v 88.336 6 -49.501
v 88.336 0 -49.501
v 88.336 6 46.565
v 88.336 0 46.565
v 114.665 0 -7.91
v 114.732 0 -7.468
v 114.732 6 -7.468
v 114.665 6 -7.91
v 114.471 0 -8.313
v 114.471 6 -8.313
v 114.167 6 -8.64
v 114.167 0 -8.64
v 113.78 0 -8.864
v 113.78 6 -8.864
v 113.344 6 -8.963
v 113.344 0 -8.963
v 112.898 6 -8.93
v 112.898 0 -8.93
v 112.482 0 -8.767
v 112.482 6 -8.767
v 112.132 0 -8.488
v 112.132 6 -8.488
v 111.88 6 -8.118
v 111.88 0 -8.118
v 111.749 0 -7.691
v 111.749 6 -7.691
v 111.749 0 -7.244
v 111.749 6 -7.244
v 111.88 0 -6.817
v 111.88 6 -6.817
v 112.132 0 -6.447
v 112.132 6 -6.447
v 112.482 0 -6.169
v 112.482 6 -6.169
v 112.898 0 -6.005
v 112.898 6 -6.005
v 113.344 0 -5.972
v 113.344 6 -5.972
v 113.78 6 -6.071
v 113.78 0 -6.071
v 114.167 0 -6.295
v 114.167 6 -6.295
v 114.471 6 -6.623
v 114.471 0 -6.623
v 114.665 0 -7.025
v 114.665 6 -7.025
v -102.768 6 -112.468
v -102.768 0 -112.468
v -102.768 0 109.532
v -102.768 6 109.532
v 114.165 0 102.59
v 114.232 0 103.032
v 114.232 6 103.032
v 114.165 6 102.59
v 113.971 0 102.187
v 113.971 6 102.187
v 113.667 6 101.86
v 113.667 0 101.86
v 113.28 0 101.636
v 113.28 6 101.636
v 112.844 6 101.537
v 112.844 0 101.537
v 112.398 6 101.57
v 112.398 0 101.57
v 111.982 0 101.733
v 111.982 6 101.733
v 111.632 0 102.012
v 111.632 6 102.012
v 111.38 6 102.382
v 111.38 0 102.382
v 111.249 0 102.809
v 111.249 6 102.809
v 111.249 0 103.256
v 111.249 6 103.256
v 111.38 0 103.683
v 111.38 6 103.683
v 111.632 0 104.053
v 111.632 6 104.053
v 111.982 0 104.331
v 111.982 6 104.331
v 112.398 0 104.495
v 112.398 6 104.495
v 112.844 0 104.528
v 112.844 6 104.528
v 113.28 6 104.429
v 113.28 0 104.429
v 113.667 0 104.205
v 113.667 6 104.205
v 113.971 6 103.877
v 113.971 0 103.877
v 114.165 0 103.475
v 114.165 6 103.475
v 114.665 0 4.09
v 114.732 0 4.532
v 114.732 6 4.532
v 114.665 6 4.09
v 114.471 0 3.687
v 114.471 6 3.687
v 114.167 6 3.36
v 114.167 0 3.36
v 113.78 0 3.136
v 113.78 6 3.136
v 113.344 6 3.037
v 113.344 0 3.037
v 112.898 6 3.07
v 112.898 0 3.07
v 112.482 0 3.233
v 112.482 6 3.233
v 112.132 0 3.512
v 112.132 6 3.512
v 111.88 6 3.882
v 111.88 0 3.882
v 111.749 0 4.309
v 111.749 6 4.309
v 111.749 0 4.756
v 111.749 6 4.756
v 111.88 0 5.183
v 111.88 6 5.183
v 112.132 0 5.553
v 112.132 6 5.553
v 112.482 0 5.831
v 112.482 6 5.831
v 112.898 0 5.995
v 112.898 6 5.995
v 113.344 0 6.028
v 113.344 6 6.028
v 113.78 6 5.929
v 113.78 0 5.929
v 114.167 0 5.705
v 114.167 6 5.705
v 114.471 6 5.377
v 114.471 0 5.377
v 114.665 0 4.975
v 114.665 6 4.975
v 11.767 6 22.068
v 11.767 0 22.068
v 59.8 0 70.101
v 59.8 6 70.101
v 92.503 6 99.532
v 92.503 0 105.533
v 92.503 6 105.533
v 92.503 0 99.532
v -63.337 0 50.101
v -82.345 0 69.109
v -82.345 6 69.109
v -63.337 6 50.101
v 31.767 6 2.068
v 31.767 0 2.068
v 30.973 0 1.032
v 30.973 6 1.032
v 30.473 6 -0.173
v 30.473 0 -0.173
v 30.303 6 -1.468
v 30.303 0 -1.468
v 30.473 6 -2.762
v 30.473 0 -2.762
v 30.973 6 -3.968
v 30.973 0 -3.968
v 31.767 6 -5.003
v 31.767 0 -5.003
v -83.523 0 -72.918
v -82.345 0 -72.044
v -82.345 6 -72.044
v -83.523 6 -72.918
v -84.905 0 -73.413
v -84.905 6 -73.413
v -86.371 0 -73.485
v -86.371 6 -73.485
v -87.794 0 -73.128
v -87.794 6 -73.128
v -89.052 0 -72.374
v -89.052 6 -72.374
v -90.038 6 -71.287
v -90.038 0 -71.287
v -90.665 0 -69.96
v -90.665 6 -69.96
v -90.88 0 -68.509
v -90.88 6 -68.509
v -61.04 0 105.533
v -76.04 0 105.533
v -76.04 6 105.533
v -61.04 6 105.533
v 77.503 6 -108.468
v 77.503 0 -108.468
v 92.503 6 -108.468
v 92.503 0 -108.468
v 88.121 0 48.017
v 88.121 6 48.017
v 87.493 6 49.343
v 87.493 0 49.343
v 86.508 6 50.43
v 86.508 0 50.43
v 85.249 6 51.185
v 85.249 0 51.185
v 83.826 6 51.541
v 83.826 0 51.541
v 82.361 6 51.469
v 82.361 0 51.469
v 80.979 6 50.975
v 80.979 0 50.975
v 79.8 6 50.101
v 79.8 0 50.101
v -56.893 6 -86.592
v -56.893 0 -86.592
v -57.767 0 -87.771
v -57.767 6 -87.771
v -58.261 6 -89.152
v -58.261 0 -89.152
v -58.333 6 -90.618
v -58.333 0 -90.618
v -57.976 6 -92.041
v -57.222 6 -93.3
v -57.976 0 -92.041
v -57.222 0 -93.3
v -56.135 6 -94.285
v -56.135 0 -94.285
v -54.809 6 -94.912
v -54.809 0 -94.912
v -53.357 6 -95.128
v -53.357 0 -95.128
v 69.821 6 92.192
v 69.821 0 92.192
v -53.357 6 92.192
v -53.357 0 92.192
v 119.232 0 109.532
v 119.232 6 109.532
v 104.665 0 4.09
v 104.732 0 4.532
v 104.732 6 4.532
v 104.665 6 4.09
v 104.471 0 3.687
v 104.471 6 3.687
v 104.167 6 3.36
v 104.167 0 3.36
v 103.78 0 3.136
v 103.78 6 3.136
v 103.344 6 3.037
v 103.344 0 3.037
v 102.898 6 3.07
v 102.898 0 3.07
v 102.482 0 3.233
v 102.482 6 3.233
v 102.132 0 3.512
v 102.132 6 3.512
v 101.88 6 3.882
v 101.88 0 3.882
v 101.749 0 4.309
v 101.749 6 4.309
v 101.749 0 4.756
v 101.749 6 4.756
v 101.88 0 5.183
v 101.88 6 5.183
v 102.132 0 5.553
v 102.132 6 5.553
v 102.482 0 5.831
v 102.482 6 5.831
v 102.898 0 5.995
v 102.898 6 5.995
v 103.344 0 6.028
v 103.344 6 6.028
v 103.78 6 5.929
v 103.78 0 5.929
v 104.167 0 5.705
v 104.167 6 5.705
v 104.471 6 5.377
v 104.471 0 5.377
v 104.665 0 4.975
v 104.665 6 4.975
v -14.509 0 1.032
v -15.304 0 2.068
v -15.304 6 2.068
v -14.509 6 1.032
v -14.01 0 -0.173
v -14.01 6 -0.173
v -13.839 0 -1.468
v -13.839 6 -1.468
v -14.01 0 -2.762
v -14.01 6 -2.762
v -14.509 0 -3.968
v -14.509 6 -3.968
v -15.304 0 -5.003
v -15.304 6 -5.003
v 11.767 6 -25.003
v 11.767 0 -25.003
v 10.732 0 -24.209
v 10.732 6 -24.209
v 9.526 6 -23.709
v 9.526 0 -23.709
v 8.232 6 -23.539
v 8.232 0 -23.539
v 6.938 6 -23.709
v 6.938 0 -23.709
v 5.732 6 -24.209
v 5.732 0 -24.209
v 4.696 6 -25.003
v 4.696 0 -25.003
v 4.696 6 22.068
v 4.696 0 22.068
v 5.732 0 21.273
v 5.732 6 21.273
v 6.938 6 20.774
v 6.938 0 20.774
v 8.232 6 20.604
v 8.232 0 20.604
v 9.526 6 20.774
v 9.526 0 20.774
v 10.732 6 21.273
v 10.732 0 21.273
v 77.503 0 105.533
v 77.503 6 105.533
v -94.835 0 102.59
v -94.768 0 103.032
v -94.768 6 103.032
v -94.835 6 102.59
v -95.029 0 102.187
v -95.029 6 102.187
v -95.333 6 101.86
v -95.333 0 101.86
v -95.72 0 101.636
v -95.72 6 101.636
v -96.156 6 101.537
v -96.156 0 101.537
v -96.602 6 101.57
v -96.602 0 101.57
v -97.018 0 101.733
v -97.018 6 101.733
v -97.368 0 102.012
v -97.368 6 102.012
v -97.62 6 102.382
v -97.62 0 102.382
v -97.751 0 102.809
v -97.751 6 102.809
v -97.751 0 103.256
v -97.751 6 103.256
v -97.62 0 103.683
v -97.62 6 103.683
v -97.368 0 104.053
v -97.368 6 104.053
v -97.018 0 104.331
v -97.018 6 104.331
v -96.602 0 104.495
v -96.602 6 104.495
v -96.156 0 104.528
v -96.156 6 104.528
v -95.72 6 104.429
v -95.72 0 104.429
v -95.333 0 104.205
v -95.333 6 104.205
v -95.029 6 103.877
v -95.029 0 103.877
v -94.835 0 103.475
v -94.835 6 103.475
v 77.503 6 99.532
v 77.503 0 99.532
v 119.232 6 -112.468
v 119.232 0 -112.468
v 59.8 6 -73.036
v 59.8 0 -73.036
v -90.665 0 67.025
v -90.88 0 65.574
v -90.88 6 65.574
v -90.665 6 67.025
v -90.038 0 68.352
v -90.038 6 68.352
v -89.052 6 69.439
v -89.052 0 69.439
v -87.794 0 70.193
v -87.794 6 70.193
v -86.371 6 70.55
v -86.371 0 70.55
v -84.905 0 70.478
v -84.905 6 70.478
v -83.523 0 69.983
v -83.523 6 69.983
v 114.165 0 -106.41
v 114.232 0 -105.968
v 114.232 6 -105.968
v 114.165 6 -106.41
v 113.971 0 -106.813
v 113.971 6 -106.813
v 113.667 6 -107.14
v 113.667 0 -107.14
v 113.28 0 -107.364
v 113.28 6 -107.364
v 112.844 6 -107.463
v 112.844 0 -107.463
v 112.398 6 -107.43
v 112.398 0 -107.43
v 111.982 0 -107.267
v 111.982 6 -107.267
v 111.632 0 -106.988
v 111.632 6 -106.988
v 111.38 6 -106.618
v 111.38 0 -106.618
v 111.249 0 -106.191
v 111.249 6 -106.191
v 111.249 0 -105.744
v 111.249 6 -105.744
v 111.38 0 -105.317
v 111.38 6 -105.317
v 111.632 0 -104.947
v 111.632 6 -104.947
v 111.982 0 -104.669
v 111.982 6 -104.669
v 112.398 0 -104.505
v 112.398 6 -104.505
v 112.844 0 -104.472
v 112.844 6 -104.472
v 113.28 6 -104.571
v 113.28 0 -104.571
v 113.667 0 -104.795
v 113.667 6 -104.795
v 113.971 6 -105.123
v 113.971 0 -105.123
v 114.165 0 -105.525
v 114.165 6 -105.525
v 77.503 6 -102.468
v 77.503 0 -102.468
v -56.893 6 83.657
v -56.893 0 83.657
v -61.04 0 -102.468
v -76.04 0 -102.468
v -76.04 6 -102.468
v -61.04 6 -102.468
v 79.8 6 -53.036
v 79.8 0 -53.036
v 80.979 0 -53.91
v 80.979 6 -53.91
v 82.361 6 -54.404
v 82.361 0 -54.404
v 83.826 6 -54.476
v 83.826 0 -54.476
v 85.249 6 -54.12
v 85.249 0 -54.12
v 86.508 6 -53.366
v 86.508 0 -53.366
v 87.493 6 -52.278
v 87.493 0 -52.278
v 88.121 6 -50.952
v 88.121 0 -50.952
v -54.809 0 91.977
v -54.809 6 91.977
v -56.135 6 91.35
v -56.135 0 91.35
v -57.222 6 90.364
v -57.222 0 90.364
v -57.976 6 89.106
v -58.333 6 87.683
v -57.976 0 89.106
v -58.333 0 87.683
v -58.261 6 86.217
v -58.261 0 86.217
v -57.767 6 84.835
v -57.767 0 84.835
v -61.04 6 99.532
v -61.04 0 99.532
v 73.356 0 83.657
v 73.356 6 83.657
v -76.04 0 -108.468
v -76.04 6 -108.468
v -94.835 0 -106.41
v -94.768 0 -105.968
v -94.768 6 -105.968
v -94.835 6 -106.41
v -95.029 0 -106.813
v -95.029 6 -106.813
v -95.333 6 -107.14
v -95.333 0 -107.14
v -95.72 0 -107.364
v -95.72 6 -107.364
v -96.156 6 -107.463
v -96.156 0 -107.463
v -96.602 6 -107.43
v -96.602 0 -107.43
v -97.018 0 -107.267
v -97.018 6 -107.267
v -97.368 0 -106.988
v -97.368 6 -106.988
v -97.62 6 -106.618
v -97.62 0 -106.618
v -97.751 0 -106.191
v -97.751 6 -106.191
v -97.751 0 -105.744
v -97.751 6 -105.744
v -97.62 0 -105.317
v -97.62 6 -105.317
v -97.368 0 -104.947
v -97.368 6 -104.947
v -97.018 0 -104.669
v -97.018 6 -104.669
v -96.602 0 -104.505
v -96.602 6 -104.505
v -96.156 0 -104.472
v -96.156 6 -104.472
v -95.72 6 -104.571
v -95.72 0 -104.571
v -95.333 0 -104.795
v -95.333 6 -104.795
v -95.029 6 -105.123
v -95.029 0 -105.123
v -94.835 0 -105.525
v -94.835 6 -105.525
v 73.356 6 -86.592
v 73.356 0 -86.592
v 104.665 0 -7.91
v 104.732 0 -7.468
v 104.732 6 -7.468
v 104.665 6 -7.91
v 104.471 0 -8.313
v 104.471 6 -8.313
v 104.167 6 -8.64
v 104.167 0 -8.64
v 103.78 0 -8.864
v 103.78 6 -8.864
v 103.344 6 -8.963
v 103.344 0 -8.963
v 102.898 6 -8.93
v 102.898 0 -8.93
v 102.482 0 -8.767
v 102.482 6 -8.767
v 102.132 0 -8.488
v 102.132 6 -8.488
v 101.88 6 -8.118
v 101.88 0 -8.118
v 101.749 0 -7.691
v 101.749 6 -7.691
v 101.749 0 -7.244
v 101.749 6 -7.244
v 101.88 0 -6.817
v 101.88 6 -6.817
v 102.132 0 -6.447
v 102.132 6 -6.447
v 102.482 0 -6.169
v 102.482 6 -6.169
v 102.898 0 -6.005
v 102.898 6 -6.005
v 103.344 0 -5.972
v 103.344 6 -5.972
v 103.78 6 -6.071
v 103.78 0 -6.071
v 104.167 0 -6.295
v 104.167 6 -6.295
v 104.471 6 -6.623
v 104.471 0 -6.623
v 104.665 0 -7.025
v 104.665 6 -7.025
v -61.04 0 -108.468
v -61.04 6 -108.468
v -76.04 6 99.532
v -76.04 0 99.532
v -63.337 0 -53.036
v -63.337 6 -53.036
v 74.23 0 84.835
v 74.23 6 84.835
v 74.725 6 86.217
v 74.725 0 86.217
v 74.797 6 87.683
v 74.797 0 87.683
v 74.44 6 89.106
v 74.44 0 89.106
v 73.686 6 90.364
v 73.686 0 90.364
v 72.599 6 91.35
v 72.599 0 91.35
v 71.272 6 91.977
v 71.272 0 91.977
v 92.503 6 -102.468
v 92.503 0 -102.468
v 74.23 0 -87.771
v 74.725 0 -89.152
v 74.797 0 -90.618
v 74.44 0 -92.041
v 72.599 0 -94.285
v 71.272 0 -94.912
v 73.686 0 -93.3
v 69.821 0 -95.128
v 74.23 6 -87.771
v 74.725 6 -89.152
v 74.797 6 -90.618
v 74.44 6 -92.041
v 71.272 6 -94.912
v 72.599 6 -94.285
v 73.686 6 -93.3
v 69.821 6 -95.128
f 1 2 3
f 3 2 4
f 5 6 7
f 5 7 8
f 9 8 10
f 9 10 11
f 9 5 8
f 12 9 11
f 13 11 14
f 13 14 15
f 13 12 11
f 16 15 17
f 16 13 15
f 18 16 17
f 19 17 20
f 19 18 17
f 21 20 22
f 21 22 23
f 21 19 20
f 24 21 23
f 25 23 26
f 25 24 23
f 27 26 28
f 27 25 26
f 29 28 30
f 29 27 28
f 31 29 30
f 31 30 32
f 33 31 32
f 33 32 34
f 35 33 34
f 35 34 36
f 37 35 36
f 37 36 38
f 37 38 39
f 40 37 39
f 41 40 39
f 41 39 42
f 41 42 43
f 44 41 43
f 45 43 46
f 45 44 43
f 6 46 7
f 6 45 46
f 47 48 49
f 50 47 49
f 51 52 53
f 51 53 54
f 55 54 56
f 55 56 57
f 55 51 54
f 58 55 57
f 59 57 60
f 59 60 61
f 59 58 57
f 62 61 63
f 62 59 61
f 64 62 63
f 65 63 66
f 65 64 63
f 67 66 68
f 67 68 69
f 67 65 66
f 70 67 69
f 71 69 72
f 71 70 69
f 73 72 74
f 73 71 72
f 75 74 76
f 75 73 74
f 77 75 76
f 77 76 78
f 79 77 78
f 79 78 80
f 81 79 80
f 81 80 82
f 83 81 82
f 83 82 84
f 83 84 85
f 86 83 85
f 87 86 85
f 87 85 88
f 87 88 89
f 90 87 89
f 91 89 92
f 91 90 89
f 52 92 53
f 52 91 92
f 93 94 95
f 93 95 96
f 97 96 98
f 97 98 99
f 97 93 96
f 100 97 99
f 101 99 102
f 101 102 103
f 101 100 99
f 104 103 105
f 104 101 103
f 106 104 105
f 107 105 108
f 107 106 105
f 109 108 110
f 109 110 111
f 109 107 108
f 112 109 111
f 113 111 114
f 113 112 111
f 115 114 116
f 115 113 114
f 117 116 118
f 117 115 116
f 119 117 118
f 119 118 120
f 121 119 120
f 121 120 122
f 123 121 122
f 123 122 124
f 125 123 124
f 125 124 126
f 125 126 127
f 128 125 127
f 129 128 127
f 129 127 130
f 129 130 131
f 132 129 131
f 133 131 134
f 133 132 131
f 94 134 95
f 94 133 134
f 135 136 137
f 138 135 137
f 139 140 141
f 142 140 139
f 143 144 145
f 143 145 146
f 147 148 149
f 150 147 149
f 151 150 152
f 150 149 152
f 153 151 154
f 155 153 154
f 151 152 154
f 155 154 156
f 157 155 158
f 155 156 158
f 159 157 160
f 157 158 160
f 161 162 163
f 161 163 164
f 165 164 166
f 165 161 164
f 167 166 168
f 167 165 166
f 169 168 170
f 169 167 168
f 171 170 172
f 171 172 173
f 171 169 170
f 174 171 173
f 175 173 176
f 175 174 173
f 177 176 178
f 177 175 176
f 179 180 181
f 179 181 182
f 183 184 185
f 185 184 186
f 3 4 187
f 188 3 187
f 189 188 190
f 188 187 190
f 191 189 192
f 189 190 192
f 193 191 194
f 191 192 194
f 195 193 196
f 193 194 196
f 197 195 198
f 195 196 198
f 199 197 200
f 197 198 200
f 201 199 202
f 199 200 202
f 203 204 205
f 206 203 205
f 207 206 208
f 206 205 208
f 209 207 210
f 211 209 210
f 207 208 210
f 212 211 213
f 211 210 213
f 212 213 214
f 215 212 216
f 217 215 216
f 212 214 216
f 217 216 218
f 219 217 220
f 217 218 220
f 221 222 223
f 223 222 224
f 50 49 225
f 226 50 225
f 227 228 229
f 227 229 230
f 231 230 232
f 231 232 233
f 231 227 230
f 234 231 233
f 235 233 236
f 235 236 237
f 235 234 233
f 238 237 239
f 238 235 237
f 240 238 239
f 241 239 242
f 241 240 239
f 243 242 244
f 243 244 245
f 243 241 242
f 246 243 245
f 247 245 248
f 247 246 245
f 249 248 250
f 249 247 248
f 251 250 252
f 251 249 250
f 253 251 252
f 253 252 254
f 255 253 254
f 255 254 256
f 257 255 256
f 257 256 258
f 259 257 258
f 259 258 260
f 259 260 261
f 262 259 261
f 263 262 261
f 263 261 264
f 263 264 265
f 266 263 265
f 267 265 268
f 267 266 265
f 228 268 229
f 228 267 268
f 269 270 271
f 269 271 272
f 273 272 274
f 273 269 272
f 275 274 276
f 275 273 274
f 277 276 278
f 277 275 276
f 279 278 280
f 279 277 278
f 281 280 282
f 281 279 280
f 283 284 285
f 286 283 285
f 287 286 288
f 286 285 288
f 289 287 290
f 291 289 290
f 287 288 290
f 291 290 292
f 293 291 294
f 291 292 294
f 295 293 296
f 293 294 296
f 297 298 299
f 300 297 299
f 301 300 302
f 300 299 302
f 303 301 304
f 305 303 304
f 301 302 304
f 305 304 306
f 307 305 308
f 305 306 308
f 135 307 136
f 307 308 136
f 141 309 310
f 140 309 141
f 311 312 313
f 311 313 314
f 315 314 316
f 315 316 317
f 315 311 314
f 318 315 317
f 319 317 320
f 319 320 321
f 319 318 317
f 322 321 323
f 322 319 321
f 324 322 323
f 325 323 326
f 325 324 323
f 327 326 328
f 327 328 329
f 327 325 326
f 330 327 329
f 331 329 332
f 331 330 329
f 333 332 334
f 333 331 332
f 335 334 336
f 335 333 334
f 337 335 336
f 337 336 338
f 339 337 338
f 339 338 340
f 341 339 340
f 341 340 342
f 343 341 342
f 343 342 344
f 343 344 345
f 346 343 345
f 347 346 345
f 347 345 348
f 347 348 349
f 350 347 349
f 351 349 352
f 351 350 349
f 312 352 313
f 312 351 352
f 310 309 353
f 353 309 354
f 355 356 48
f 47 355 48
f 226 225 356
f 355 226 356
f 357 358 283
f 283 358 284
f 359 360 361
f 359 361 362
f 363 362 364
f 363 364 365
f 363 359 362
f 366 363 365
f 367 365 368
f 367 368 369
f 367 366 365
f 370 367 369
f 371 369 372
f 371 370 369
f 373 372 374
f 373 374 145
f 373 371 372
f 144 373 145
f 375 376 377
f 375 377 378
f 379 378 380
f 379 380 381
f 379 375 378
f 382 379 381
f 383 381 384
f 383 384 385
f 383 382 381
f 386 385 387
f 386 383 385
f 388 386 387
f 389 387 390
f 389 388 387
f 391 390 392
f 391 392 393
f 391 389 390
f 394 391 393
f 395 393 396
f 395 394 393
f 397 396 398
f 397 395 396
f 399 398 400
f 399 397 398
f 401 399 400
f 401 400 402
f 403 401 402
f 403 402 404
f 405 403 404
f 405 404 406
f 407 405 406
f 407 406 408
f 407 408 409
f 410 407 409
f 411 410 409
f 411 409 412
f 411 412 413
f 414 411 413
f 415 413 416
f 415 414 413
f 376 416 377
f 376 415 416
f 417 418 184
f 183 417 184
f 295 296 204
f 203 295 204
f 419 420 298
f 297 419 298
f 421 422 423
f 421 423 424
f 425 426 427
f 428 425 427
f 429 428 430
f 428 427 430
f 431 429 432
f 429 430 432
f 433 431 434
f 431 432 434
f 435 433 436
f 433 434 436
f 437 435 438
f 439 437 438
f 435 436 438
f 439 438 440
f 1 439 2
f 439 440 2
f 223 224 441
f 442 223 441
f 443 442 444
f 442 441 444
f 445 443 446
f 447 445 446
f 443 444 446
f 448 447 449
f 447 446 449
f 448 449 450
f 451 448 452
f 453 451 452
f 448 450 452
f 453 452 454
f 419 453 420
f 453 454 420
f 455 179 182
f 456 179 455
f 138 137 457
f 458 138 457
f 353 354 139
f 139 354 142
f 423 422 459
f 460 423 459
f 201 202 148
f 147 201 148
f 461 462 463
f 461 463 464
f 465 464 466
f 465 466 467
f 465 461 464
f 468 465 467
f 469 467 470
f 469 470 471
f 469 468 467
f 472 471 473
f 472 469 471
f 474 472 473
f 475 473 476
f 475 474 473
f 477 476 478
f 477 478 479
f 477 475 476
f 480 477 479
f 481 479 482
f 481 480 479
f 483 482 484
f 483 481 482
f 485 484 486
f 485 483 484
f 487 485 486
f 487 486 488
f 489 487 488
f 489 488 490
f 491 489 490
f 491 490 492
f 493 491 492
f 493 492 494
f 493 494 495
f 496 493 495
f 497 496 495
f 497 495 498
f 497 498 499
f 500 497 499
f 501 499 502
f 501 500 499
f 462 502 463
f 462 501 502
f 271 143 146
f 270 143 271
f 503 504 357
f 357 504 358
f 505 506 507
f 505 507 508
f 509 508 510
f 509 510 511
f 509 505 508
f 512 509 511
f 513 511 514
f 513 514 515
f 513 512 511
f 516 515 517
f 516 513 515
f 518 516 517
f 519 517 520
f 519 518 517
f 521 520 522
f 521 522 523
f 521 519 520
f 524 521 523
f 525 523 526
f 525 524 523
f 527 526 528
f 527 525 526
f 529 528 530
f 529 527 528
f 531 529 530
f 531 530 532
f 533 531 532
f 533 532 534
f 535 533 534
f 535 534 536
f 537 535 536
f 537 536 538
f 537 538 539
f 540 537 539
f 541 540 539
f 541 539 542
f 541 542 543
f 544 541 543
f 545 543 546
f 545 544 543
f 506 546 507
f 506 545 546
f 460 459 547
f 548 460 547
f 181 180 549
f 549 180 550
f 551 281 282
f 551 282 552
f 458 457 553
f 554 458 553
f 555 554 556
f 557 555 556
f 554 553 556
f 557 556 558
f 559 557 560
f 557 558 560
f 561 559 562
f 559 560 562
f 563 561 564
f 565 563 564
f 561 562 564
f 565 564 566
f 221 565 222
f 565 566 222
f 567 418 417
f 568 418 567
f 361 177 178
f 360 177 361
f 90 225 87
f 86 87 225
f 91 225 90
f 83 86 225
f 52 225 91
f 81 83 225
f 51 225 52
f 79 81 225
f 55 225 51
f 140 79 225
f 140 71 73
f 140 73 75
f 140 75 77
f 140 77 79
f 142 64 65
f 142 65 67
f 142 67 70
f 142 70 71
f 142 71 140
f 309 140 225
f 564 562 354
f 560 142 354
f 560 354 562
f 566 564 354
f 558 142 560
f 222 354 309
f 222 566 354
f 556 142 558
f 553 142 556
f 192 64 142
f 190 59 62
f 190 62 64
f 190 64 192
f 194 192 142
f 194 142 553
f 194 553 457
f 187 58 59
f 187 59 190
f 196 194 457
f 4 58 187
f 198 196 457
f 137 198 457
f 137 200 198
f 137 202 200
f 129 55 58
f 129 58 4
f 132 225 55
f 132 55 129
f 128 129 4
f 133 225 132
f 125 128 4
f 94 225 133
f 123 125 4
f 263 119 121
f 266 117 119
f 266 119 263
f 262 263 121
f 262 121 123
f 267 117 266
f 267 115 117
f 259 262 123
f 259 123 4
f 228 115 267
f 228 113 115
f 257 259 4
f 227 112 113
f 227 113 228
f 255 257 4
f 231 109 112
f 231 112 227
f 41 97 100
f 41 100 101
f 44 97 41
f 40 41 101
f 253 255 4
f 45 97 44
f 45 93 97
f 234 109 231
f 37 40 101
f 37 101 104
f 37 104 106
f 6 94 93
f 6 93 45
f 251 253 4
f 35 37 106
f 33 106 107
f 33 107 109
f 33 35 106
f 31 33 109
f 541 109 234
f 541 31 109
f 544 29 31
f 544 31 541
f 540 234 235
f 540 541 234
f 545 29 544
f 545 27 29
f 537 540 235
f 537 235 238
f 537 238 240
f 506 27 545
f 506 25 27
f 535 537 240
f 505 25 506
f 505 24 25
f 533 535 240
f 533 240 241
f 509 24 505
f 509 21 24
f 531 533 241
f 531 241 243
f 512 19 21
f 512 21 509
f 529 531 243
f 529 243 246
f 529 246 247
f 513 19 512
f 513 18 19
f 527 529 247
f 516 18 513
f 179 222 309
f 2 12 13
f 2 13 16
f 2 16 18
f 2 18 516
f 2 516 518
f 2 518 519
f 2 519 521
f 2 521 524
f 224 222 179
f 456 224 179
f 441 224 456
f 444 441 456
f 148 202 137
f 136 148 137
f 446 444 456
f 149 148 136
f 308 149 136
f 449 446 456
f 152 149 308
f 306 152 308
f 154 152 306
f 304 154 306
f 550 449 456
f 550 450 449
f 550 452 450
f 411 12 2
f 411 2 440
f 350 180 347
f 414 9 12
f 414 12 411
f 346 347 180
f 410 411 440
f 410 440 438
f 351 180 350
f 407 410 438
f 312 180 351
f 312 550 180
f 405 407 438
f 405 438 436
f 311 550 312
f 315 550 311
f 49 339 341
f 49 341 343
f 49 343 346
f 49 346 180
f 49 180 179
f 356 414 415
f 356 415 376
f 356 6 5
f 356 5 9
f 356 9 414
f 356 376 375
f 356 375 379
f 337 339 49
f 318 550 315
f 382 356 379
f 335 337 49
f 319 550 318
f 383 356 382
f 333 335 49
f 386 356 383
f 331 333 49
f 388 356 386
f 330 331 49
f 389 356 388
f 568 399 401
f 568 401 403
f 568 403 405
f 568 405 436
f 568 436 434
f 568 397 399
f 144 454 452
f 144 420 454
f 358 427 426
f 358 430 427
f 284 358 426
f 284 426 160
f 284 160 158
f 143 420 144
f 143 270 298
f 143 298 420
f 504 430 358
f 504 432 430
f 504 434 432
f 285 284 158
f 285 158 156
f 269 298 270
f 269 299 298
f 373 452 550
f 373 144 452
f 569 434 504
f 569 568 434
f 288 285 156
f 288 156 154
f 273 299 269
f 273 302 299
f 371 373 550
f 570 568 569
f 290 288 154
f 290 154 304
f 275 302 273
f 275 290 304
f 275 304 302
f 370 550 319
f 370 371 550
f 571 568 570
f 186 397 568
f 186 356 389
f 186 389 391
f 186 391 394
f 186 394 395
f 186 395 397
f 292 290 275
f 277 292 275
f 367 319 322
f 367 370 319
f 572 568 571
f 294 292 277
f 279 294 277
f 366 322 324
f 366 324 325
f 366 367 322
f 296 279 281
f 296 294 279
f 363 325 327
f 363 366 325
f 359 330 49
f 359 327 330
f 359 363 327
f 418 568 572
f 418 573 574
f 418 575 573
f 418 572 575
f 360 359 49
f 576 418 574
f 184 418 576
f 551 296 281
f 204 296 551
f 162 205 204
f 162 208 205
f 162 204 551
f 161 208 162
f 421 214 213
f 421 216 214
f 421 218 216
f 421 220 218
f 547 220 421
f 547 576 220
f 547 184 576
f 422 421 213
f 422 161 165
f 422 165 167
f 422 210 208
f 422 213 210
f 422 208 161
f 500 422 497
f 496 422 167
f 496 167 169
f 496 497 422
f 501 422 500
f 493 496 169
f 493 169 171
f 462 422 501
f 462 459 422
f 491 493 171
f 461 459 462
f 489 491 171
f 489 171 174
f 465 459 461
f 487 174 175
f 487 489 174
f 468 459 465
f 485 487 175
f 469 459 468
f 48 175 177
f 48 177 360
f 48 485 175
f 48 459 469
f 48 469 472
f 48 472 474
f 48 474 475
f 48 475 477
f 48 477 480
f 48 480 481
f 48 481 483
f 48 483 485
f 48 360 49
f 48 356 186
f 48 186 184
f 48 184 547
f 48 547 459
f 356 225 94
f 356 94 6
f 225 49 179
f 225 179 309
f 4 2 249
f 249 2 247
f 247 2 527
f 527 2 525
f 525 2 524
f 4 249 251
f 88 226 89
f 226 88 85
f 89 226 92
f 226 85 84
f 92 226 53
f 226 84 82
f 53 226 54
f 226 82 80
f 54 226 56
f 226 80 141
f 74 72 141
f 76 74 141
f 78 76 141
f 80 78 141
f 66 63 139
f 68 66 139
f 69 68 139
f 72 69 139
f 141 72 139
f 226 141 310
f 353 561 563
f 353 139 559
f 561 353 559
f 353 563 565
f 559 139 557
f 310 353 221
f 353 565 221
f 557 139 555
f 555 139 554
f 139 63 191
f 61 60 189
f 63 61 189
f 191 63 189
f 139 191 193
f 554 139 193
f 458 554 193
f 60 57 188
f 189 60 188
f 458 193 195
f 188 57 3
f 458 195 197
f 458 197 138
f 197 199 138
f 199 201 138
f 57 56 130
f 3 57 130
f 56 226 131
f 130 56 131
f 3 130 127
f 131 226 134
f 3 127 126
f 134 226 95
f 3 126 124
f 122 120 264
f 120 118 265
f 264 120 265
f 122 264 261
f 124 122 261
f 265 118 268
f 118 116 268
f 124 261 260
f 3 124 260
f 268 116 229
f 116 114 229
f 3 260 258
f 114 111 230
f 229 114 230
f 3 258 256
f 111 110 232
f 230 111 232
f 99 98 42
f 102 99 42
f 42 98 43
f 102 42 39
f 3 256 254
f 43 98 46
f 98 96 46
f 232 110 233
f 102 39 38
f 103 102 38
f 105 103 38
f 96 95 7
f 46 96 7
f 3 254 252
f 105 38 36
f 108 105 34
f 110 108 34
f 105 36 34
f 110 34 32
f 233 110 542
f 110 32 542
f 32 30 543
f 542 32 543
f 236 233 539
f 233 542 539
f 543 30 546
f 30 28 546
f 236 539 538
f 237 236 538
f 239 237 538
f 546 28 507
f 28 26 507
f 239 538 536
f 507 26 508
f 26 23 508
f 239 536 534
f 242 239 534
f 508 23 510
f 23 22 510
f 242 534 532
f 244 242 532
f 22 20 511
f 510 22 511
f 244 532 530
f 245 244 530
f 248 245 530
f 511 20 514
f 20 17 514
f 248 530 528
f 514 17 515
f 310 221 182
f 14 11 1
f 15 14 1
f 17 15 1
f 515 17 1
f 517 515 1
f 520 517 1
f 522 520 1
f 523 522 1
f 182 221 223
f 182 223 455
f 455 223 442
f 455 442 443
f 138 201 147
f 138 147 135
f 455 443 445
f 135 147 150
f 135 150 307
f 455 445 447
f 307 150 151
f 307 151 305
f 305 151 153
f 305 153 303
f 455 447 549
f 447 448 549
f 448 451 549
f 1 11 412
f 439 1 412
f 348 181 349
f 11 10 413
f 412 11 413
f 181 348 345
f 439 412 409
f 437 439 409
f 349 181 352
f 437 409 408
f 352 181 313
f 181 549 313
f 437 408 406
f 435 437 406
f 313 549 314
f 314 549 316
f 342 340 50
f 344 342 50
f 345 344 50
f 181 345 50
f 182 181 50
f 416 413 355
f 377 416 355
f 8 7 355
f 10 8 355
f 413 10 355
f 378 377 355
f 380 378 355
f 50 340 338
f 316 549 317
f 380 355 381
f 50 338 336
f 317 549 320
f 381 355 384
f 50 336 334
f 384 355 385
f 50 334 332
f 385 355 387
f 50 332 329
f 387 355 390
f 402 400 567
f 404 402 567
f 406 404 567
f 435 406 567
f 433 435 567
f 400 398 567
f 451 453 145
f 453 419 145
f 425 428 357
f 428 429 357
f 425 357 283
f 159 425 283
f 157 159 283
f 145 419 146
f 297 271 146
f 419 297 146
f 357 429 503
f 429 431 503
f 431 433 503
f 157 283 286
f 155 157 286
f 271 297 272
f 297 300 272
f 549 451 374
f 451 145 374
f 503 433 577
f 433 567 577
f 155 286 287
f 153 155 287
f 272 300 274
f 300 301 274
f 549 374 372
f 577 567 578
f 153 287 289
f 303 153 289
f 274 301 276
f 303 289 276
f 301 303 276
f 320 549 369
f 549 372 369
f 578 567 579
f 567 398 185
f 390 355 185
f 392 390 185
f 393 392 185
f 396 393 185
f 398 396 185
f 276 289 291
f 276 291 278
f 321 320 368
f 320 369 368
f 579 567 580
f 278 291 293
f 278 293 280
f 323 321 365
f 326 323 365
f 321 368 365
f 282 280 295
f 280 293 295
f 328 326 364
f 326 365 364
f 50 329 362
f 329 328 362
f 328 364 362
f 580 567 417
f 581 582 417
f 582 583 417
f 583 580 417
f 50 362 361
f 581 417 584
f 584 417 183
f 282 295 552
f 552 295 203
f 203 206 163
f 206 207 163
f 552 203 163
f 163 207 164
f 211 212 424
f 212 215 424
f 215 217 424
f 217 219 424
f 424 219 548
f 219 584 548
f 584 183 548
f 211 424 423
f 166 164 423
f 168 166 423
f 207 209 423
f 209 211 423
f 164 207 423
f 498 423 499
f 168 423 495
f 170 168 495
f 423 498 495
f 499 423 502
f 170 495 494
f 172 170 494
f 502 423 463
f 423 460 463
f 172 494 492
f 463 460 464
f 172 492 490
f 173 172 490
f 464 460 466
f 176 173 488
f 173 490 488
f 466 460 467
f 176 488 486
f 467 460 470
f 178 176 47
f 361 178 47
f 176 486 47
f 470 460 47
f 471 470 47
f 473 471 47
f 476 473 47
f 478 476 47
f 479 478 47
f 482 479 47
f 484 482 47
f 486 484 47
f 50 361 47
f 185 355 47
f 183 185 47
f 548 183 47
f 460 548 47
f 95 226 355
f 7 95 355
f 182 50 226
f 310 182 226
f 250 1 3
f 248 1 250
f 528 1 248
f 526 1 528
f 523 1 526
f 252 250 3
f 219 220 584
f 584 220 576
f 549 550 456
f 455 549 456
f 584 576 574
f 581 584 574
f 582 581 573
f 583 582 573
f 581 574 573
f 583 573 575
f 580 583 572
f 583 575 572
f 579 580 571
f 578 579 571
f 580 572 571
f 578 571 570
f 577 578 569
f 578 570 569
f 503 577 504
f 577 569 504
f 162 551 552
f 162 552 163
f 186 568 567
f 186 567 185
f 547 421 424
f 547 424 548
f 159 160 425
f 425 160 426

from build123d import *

# Parameters (mm, degrees)
SKETCH_1_R      = 1.5
SKETCH_1_W      = 14.999960721
SKETCH_1_H      = 6.000098196
SKETCH_1_H_2    = 6.000098195
SKETCH_1_W_2    = 14.999960722
EXTRUDE_1_DEPTH = 6


with BuildPart() as part:
    # Эскиз1 → Бобышка-Вытянуть1 (new body)
    with BuildSketch(Plane(origin=(0, 0, 0), x_dir=(1, 0, 0), z_dir=(0, 1, 0))):
        Polygon((-102.768102854, -104.532435011), (-102.768102854, -92.192478988), (-102.768102854, -82.192478988), (-102.768102854, 85.127608967), (-102.768102854, 95.127608967), (-102.768102854, 107.467564989), (-102.768102854, 112.467564989), (-97.768102854, 112.467564989), (114.231897146, 112.467564989), (119.231897146, 112.467564989), (119.231897146, 107.467564989), (119.231897146, -104.532435011), (119.231897146, -109.532435011), (114.231897146, -109.532435011), (-97.768102854, -109.532435011), (-102.768102854, -109.532435011), align=None)
        with Locations((-96.268102854, 105.967564989)):
            Circle(SKETCH_1_R, mode=Mode.SUBTRACT)
        with Locations((112.731897146, 105.967564989)):
            Circle(SKETCH_1_R, mode=Mode.SUBTRACT)
        with Locations((-96.268102854, -103.032435011)):
            Circle(SKETCH_1_R, mode=Mode.SUBTRACT)
        with Locations((112.731897146, -103.032435011)):
            Circle(SKETCH_1_R, mode=Mode.SUBTRACT)
        with Locations((103.231897146, 7.467564989)):
            Circle(SKETCH_1_R, mode=Mode.SUBTRACT)
        with Locations((113.231897146, 7.467564989)):
            Circle(SKETCH_1_R, mode=Mode.SUBTRACT)
        with Locations((113.231897146, -4.532435011)):
            Circle(SKETCH_1_R, mode=Mode.SUBTRACT)
        with Locations((103.231897146, -4.532435011)):
            Circle(SKETCH_1_R, mode=Mode.SUBTRACT)
        with Locations((-68.539568551, 105.467614087)):
            Rectangle(SKETCH_1_W, SKETCH_1_H, mode=Mode.SUBTRACT)
        with Locations((-68.539568551, -102.532484109)):
            Rectangle(SKETCH_1_W, SKETCH_1_H_2, mode=Mode.SUBTRACT)
        with BuildLine():
            Line((-15.30363676, 5.003098895), (-63.336645349, 53.036107484))
            Line((-63.336645349, 53.036107484), (-82.344918946, 72.044381082))
            ThreePointArc((-82.344918946, 72.044381082), (-87.793870014, 73.128244838), (-90.880452852, 68.508847176))
            Line((-90.880452852, 68.508847176), (-90.880452852, -65.573717197))
            ThreePointArc((-90.880452852, -65.573717197), (-87.793870014, -70.193114859), (-82.344918946, -69.109251103))
            Line((-82.344918946, -69.109251103), (-63.336645349, -50.100977505))
            Line((-63.336645349, -50.100977505), (-15.30363676, -2.067968916))
            ThreePointArc((-15.30363676, -2.067968916), (-13.839170666, 1.467564989), (-15.30363676, 5.003098895))
        make_face(mode=Mode.SUBTRACT)
        with BuildLine():
            Line((31.767431052, 5.003098895), (79.800439641, 53.036107484))
            ThreePointArc((79.800439641, 53.036107484), (85.249390708, 54.119971241), (88.335973547, 49.500573578))
            Line((88.335973547, 49.500573578), (88.335973547, -46.5654436))
            ThreePointArc((88.335973547, -46.5654436), (85.249390708, -51.184841262), (79.800439641, -50.100977505))
            Line((79.800439641, -50.100977505), (31.767431052, -2.067968916))
            ThreePointArc((31.767431052, -2.067968916), (30.302964958, 1.467564989), (31.767431052, 5.003098895))
        make_face(mode=Mode.SUBTRACT)
        with BuildLine():
            Line((4.69636324, 25.003098895), (-43.336645349, 73.036107484))
            Line((-43.336645349, 73.036107484), (-56.892612926, 86.592075061))
            ThreePointArc((-56.892612926, 86.592075061), (-57.976476682, 92.041026129), (-53.35707902, 95.127608967))
            Line((-53.35707902, 95.127608967), (69.820873311, 95.127608967))
            ThreePointArc((69.820873311, 95.127608967), (74.440270974, 92.041026129), (73.356407217, 86.592075061))
            Line((73.356407217, 86.592075061), (59.800439641, 73.036107484))
            Line((59.800439641, 73.036107484), (11.767431052, 25.003098895))
            ThreePointArc((11.767431052, 25.003098895), (8.231897146, 23.538632801), (4.69636324, 25.003098895))
        make_face(mode=Mode.SUBTRACT)
        with BuildLine():
            Line((69.820873311, -92.192478988), (-53.35707902, -92.192478988))
            ThreePointArc((-53.35707902, -92.192478988), (-57.976476682, -89.10589615), (-56.892612926, -83.656945082))
            Line((-56.892612926, -83.656945082), (-43.336645349, -70.100977505))
            Line((-43.336645349, -70.100977505), (4.69636324, -22.067968916))
            ThreePointArc((4.69636324, -22.067968916), (8.231897146, -20.603502822), (11.767431052, -22.067968916))
            Line((11.767431052, -22.067968916), (59.800439641, -70.100977505))
            Line((59.800439641, -70.100977505), (73.356407217, -83.656945082))
            ThreePointArc((73.356407217, -83.656945082), (74.440270974, -89.10589615), (69.820873311, -92.192478988))
        make_face(mode=Mode.SUBTRACT)
        with Locations((85.003362843, -102.532484109)):
            Rectangle(SKETCH_1_W_2, SKETCH_1_H_2, mode=Mode.SUBTRACT)
        with Locations((85.003362843, 105.467614087)):
            Rectangle(SKETCH_1_W_2, SKETCH_1_H, mode=Mode.SUBTRACT)
    extrude(amount=EXTRUDE_1_DEPTH)


solid = part.part
